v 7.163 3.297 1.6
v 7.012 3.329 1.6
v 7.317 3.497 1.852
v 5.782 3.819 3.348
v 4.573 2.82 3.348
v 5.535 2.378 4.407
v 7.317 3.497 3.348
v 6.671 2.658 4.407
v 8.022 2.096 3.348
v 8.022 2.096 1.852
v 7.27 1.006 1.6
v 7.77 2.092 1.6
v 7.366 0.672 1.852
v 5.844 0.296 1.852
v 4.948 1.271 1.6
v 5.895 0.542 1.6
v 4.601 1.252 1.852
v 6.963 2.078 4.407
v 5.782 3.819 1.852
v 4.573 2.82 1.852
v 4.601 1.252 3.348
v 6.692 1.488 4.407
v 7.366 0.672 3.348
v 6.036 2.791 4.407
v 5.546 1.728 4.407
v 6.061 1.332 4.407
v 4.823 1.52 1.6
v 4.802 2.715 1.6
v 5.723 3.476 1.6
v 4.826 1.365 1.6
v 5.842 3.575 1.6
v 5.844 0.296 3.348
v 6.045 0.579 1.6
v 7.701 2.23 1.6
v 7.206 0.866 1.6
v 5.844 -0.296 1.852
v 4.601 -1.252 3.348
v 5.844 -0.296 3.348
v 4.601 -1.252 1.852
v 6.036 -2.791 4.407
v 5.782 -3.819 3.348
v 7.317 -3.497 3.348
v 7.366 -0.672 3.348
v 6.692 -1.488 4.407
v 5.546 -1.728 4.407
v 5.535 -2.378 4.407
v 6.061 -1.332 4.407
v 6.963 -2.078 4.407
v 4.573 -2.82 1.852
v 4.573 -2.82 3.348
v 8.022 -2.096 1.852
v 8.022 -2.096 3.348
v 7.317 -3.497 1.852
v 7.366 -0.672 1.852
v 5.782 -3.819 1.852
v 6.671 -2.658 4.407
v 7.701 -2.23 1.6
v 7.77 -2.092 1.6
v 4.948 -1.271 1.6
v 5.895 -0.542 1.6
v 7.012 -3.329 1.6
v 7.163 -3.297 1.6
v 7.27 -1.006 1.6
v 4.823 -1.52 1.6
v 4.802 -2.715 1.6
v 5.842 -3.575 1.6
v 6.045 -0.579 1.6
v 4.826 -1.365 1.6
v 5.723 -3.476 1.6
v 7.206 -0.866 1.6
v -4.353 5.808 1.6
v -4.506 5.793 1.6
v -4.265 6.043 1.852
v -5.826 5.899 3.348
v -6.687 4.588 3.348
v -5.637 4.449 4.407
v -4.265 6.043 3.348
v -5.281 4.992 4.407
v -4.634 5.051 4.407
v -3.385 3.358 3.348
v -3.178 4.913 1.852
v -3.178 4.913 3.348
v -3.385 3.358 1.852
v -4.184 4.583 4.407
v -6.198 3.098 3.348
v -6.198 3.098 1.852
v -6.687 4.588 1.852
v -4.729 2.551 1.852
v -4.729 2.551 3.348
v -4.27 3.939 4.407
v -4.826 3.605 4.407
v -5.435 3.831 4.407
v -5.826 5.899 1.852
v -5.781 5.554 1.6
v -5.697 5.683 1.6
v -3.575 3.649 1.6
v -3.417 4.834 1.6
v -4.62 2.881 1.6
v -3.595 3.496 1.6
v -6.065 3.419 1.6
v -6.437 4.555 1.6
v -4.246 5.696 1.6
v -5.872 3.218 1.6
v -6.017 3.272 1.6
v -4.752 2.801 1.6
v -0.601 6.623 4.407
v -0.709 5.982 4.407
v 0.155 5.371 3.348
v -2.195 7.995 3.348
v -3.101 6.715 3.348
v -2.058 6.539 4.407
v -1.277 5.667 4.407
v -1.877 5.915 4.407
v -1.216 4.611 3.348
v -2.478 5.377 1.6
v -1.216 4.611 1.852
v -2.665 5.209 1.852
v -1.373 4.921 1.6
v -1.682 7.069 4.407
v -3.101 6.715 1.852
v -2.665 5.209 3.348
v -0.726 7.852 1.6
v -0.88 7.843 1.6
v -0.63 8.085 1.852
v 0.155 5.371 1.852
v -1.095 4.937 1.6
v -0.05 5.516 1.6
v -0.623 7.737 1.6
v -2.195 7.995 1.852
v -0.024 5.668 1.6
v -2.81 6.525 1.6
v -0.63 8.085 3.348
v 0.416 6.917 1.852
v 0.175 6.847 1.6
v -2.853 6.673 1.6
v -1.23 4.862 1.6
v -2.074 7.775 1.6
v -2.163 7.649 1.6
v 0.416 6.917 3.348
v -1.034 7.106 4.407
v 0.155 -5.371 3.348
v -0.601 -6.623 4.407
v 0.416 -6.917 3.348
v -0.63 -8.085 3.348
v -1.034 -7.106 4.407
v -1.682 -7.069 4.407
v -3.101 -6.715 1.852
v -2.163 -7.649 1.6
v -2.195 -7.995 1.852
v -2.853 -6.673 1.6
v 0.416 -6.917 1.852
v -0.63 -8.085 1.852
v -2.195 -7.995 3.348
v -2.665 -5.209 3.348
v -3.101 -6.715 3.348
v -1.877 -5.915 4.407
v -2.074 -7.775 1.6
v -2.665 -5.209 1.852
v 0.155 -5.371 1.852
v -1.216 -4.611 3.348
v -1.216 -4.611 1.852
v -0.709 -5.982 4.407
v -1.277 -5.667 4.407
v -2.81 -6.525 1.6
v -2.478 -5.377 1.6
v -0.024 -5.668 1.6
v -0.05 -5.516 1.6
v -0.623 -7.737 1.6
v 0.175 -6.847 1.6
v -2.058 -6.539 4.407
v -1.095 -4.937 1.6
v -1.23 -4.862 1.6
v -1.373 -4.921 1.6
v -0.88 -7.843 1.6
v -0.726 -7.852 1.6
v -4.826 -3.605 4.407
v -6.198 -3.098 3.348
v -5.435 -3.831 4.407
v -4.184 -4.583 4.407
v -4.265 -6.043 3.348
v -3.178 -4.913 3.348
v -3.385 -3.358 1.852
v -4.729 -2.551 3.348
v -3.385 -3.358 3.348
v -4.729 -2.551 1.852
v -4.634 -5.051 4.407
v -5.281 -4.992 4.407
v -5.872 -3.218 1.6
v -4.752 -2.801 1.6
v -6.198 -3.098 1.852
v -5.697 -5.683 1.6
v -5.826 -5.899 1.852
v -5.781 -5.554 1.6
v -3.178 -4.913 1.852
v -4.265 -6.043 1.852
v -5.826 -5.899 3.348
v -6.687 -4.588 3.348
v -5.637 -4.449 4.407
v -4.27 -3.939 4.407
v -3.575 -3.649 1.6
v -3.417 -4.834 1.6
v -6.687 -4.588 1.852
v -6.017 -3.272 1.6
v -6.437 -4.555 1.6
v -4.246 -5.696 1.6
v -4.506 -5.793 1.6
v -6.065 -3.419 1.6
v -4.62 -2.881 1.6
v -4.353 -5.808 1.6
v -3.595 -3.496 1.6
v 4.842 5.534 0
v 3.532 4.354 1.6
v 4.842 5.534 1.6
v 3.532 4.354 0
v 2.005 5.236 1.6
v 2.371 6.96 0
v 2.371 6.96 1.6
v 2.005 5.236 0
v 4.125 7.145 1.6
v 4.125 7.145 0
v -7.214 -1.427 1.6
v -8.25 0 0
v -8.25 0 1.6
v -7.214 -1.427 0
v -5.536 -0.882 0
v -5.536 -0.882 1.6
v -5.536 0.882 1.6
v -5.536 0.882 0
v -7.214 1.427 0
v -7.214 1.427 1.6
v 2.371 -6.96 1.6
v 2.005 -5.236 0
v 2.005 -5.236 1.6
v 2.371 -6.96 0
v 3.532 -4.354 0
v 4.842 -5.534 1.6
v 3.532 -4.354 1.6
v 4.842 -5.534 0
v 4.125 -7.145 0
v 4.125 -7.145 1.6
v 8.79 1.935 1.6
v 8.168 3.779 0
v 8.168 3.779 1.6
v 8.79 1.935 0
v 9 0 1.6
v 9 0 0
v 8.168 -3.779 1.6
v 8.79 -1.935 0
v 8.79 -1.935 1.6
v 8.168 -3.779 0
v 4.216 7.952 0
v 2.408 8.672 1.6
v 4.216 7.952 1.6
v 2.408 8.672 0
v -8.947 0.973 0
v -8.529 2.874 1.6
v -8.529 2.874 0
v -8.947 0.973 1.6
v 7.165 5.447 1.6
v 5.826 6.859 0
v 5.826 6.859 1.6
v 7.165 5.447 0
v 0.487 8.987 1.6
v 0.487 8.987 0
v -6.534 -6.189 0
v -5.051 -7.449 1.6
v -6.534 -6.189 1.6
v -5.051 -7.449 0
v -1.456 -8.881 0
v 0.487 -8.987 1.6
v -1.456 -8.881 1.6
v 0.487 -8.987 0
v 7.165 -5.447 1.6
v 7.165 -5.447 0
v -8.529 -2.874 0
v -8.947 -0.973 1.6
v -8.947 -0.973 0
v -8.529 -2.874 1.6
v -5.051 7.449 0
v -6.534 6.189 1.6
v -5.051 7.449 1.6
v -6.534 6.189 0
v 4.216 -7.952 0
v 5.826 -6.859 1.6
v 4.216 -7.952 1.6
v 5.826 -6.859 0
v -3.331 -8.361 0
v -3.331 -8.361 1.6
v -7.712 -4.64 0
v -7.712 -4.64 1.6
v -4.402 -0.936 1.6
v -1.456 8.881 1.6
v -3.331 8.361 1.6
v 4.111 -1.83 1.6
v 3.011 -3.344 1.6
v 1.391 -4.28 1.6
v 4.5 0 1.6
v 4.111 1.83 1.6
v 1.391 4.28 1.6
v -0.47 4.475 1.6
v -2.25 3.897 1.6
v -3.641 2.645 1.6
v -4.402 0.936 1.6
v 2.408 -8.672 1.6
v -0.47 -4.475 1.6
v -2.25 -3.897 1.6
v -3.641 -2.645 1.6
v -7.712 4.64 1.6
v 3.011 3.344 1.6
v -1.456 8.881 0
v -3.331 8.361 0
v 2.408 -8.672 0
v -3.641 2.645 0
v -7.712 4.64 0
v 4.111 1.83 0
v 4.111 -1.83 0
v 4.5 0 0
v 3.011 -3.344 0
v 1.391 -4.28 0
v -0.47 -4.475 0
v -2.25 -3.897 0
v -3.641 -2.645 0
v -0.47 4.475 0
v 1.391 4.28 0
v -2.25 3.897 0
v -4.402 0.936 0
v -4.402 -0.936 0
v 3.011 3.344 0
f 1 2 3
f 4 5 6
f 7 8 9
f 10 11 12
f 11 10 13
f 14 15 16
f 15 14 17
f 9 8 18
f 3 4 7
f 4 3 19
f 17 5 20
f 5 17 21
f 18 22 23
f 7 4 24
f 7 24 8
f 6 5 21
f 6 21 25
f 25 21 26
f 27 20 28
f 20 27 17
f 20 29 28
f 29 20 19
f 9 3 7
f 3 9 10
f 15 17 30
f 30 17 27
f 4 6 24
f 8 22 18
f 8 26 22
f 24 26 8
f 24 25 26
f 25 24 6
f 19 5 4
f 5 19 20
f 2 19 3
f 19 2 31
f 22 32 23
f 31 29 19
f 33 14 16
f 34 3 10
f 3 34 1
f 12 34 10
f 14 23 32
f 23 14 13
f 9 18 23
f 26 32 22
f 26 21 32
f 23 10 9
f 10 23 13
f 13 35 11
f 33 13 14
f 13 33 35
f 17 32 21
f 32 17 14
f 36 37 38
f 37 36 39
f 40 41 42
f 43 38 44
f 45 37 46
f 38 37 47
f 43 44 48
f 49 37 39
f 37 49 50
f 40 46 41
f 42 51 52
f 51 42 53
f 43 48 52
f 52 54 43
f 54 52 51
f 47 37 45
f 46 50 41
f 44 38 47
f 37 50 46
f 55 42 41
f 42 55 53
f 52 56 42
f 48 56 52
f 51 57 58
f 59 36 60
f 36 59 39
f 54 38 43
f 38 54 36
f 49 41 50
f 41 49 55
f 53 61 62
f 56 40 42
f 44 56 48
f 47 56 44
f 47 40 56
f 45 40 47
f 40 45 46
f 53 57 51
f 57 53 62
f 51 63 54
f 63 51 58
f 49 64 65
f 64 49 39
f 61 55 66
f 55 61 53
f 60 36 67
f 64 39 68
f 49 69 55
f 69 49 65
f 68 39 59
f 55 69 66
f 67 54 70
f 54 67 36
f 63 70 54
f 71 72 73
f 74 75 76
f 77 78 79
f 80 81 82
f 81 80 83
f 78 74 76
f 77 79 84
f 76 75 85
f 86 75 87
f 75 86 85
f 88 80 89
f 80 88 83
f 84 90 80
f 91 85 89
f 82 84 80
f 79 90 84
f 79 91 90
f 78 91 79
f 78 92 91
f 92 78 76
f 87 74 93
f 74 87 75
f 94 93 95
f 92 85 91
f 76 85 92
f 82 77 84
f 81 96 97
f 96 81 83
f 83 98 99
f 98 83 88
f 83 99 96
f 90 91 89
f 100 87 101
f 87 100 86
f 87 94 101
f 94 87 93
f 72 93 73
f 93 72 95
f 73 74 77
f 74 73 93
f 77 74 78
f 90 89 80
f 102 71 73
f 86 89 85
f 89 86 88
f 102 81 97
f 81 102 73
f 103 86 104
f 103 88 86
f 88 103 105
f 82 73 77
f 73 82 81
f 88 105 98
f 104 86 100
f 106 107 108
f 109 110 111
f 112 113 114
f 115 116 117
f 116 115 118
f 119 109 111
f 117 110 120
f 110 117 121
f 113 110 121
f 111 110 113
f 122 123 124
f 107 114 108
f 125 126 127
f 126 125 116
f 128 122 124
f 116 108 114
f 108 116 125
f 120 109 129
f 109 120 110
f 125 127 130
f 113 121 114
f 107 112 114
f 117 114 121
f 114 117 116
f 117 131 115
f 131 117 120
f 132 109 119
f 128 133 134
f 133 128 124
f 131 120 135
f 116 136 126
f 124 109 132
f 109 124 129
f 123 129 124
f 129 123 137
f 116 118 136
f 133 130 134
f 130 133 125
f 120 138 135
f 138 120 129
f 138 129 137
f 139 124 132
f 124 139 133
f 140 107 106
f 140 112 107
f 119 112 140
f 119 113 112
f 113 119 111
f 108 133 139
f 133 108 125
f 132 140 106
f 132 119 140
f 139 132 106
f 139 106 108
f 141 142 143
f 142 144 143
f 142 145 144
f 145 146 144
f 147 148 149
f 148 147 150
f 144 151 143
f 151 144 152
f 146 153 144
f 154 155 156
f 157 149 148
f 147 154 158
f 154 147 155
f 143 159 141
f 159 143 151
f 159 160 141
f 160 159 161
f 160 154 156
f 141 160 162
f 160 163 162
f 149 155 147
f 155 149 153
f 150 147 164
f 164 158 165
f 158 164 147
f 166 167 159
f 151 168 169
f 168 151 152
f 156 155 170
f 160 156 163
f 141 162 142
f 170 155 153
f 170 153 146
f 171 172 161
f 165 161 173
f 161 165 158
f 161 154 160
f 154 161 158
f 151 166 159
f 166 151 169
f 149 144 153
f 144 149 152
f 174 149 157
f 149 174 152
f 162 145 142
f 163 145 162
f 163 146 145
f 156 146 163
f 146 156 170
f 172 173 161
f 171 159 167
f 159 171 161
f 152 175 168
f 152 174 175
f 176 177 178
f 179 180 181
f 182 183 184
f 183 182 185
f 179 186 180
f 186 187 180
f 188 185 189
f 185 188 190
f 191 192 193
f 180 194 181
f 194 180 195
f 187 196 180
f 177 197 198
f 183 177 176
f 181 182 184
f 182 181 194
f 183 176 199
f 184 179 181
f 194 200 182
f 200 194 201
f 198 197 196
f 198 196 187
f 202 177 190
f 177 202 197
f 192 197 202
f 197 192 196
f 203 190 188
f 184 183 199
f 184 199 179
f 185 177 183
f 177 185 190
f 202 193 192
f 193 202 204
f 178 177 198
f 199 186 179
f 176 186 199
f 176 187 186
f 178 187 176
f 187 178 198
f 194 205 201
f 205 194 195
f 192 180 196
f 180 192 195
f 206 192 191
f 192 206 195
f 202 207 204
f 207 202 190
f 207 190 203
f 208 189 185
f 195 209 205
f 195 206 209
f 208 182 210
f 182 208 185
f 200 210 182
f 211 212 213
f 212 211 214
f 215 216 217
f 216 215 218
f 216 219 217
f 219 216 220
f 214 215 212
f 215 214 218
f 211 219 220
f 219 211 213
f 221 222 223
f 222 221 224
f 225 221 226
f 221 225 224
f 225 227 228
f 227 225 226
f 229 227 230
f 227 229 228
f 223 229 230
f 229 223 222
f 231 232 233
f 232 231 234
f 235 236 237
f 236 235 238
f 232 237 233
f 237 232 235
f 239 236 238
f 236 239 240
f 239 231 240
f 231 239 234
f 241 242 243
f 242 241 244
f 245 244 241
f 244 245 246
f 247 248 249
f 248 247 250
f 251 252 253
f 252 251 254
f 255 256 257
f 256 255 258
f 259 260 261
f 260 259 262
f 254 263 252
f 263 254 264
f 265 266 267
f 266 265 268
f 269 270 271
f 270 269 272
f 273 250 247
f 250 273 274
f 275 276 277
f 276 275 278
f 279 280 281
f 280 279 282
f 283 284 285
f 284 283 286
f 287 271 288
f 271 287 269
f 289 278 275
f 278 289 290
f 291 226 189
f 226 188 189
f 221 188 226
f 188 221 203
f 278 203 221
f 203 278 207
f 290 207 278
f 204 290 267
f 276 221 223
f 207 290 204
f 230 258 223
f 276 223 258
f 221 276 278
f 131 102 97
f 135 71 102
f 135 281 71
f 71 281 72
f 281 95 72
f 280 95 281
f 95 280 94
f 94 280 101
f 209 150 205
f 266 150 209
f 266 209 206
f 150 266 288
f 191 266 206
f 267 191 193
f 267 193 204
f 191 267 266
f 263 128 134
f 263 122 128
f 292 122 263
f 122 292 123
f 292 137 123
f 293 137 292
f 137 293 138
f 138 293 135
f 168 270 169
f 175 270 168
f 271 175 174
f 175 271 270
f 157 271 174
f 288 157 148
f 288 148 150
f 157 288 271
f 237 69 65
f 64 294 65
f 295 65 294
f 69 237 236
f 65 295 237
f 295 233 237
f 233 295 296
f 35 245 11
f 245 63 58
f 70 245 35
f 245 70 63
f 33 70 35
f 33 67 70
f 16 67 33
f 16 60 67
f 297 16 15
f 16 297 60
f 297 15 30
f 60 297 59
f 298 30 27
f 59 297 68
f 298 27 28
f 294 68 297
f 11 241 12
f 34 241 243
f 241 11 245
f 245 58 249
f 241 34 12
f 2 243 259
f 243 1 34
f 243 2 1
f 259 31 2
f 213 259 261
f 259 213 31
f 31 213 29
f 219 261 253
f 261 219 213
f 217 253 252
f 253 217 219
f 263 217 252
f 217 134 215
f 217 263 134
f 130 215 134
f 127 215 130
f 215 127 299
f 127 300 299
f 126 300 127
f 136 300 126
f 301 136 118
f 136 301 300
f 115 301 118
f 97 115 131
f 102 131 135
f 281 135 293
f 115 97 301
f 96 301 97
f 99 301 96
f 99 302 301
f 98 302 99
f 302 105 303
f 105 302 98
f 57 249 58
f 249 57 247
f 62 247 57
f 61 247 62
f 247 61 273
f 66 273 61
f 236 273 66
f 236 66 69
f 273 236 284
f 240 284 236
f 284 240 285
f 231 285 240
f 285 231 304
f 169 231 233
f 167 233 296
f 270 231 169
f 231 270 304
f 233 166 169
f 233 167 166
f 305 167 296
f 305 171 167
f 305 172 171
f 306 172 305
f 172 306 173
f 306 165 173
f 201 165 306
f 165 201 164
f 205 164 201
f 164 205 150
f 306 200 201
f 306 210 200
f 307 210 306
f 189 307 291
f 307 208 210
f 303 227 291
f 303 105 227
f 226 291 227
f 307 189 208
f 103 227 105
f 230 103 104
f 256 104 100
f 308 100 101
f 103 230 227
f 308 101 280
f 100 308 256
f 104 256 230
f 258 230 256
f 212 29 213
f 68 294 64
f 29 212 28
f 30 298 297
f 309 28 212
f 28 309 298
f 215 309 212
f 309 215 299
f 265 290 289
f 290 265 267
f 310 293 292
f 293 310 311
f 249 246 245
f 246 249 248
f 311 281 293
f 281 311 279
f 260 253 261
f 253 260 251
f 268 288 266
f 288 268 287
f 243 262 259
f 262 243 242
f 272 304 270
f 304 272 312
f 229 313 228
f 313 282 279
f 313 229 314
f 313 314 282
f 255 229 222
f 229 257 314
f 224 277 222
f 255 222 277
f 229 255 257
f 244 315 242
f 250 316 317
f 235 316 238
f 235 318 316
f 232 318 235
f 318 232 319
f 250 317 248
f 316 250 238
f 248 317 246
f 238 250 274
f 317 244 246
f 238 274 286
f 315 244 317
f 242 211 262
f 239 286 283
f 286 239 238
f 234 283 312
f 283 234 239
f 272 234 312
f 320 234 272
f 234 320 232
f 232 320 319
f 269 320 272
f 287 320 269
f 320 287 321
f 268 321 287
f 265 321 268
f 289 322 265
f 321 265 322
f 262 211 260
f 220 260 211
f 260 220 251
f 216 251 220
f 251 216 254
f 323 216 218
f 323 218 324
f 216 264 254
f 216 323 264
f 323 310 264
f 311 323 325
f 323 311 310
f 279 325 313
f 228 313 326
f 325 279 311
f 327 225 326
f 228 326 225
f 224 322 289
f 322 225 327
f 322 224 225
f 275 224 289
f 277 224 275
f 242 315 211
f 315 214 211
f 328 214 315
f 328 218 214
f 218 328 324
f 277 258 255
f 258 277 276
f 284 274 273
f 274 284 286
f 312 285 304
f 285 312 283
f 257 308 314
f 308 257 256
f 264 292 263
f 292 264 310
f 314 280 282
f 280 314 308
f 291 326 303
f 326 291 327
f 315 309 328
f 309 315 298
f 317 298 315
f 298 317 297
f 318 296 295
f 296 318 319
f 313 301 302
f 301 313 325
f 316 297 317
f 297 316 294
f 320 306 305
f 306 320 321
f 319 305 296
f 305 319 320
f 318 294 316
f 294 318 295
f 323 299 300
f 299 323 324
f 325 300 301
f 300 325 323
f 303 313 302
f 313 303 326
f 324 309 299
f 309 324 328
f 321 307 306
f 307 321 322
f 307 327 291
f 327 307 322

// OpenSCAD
//sqrt (((3.9116÷2)^2)−((3.9116−2.6)^2))
module base() {
    r0 = (8+1)/2;
    r1 = (18)/2;
    ball_r = (0.154 * 25.4) / 2;
    ball_center = (r0 + (r1-r0)/2);
    translate([0,0,2.6]) {
        rotate([0,0,1]) translate([ball_center - 0.5,0,0])
            translate([0,ball_r,0]) sphere(r=ball_r);
        rotate([0,0,-1]) translate([ball_center - 0.5,0,0])
            translate([0,-ball_r,0]) sphere(r=ball_r);

        rotate([0,0,120+1]) translate([ball_center - 0.5,0,0])
            translate([0,ball_r,0]) sphere(r=ball_r);
        rotate([0,0,120-1]) translate([ball_center - 0.5,0,0])
            translate([0,-ball_r,0]) sphere(r=ball_r);

        rotate([0,0,240+1]) translate([ball_center - 0.5,0,0])
            translate([0,ball_r,0]) sphere(r=ball_r);
        rotate([0,0,240-1]) translate([ball_center - 0.5,0,0])
            translate([0,-ball_r,0]) sphere(r=ball_r);
    }

    difference() {
        cylinder(r=r1, h=1.6);
        translate([0,0,-0.5]) cylinder(r=r0, h=3);
        
        // screw holes
        translate([0,0,-0.5]) {
            rotate([0,0,60]) translate([ball_center,0,0])
                cylinder(r=3/2, h=3);
            rotate([0,0,60+120]) translate([ball_center,0,0])
                cylinder(r=3/2, h=3);
            rotate([0,0,60+120+120]) translate([ball_center,0,0])
                cylinder(r=3/2, h=3);
        }
    }
}

base();
